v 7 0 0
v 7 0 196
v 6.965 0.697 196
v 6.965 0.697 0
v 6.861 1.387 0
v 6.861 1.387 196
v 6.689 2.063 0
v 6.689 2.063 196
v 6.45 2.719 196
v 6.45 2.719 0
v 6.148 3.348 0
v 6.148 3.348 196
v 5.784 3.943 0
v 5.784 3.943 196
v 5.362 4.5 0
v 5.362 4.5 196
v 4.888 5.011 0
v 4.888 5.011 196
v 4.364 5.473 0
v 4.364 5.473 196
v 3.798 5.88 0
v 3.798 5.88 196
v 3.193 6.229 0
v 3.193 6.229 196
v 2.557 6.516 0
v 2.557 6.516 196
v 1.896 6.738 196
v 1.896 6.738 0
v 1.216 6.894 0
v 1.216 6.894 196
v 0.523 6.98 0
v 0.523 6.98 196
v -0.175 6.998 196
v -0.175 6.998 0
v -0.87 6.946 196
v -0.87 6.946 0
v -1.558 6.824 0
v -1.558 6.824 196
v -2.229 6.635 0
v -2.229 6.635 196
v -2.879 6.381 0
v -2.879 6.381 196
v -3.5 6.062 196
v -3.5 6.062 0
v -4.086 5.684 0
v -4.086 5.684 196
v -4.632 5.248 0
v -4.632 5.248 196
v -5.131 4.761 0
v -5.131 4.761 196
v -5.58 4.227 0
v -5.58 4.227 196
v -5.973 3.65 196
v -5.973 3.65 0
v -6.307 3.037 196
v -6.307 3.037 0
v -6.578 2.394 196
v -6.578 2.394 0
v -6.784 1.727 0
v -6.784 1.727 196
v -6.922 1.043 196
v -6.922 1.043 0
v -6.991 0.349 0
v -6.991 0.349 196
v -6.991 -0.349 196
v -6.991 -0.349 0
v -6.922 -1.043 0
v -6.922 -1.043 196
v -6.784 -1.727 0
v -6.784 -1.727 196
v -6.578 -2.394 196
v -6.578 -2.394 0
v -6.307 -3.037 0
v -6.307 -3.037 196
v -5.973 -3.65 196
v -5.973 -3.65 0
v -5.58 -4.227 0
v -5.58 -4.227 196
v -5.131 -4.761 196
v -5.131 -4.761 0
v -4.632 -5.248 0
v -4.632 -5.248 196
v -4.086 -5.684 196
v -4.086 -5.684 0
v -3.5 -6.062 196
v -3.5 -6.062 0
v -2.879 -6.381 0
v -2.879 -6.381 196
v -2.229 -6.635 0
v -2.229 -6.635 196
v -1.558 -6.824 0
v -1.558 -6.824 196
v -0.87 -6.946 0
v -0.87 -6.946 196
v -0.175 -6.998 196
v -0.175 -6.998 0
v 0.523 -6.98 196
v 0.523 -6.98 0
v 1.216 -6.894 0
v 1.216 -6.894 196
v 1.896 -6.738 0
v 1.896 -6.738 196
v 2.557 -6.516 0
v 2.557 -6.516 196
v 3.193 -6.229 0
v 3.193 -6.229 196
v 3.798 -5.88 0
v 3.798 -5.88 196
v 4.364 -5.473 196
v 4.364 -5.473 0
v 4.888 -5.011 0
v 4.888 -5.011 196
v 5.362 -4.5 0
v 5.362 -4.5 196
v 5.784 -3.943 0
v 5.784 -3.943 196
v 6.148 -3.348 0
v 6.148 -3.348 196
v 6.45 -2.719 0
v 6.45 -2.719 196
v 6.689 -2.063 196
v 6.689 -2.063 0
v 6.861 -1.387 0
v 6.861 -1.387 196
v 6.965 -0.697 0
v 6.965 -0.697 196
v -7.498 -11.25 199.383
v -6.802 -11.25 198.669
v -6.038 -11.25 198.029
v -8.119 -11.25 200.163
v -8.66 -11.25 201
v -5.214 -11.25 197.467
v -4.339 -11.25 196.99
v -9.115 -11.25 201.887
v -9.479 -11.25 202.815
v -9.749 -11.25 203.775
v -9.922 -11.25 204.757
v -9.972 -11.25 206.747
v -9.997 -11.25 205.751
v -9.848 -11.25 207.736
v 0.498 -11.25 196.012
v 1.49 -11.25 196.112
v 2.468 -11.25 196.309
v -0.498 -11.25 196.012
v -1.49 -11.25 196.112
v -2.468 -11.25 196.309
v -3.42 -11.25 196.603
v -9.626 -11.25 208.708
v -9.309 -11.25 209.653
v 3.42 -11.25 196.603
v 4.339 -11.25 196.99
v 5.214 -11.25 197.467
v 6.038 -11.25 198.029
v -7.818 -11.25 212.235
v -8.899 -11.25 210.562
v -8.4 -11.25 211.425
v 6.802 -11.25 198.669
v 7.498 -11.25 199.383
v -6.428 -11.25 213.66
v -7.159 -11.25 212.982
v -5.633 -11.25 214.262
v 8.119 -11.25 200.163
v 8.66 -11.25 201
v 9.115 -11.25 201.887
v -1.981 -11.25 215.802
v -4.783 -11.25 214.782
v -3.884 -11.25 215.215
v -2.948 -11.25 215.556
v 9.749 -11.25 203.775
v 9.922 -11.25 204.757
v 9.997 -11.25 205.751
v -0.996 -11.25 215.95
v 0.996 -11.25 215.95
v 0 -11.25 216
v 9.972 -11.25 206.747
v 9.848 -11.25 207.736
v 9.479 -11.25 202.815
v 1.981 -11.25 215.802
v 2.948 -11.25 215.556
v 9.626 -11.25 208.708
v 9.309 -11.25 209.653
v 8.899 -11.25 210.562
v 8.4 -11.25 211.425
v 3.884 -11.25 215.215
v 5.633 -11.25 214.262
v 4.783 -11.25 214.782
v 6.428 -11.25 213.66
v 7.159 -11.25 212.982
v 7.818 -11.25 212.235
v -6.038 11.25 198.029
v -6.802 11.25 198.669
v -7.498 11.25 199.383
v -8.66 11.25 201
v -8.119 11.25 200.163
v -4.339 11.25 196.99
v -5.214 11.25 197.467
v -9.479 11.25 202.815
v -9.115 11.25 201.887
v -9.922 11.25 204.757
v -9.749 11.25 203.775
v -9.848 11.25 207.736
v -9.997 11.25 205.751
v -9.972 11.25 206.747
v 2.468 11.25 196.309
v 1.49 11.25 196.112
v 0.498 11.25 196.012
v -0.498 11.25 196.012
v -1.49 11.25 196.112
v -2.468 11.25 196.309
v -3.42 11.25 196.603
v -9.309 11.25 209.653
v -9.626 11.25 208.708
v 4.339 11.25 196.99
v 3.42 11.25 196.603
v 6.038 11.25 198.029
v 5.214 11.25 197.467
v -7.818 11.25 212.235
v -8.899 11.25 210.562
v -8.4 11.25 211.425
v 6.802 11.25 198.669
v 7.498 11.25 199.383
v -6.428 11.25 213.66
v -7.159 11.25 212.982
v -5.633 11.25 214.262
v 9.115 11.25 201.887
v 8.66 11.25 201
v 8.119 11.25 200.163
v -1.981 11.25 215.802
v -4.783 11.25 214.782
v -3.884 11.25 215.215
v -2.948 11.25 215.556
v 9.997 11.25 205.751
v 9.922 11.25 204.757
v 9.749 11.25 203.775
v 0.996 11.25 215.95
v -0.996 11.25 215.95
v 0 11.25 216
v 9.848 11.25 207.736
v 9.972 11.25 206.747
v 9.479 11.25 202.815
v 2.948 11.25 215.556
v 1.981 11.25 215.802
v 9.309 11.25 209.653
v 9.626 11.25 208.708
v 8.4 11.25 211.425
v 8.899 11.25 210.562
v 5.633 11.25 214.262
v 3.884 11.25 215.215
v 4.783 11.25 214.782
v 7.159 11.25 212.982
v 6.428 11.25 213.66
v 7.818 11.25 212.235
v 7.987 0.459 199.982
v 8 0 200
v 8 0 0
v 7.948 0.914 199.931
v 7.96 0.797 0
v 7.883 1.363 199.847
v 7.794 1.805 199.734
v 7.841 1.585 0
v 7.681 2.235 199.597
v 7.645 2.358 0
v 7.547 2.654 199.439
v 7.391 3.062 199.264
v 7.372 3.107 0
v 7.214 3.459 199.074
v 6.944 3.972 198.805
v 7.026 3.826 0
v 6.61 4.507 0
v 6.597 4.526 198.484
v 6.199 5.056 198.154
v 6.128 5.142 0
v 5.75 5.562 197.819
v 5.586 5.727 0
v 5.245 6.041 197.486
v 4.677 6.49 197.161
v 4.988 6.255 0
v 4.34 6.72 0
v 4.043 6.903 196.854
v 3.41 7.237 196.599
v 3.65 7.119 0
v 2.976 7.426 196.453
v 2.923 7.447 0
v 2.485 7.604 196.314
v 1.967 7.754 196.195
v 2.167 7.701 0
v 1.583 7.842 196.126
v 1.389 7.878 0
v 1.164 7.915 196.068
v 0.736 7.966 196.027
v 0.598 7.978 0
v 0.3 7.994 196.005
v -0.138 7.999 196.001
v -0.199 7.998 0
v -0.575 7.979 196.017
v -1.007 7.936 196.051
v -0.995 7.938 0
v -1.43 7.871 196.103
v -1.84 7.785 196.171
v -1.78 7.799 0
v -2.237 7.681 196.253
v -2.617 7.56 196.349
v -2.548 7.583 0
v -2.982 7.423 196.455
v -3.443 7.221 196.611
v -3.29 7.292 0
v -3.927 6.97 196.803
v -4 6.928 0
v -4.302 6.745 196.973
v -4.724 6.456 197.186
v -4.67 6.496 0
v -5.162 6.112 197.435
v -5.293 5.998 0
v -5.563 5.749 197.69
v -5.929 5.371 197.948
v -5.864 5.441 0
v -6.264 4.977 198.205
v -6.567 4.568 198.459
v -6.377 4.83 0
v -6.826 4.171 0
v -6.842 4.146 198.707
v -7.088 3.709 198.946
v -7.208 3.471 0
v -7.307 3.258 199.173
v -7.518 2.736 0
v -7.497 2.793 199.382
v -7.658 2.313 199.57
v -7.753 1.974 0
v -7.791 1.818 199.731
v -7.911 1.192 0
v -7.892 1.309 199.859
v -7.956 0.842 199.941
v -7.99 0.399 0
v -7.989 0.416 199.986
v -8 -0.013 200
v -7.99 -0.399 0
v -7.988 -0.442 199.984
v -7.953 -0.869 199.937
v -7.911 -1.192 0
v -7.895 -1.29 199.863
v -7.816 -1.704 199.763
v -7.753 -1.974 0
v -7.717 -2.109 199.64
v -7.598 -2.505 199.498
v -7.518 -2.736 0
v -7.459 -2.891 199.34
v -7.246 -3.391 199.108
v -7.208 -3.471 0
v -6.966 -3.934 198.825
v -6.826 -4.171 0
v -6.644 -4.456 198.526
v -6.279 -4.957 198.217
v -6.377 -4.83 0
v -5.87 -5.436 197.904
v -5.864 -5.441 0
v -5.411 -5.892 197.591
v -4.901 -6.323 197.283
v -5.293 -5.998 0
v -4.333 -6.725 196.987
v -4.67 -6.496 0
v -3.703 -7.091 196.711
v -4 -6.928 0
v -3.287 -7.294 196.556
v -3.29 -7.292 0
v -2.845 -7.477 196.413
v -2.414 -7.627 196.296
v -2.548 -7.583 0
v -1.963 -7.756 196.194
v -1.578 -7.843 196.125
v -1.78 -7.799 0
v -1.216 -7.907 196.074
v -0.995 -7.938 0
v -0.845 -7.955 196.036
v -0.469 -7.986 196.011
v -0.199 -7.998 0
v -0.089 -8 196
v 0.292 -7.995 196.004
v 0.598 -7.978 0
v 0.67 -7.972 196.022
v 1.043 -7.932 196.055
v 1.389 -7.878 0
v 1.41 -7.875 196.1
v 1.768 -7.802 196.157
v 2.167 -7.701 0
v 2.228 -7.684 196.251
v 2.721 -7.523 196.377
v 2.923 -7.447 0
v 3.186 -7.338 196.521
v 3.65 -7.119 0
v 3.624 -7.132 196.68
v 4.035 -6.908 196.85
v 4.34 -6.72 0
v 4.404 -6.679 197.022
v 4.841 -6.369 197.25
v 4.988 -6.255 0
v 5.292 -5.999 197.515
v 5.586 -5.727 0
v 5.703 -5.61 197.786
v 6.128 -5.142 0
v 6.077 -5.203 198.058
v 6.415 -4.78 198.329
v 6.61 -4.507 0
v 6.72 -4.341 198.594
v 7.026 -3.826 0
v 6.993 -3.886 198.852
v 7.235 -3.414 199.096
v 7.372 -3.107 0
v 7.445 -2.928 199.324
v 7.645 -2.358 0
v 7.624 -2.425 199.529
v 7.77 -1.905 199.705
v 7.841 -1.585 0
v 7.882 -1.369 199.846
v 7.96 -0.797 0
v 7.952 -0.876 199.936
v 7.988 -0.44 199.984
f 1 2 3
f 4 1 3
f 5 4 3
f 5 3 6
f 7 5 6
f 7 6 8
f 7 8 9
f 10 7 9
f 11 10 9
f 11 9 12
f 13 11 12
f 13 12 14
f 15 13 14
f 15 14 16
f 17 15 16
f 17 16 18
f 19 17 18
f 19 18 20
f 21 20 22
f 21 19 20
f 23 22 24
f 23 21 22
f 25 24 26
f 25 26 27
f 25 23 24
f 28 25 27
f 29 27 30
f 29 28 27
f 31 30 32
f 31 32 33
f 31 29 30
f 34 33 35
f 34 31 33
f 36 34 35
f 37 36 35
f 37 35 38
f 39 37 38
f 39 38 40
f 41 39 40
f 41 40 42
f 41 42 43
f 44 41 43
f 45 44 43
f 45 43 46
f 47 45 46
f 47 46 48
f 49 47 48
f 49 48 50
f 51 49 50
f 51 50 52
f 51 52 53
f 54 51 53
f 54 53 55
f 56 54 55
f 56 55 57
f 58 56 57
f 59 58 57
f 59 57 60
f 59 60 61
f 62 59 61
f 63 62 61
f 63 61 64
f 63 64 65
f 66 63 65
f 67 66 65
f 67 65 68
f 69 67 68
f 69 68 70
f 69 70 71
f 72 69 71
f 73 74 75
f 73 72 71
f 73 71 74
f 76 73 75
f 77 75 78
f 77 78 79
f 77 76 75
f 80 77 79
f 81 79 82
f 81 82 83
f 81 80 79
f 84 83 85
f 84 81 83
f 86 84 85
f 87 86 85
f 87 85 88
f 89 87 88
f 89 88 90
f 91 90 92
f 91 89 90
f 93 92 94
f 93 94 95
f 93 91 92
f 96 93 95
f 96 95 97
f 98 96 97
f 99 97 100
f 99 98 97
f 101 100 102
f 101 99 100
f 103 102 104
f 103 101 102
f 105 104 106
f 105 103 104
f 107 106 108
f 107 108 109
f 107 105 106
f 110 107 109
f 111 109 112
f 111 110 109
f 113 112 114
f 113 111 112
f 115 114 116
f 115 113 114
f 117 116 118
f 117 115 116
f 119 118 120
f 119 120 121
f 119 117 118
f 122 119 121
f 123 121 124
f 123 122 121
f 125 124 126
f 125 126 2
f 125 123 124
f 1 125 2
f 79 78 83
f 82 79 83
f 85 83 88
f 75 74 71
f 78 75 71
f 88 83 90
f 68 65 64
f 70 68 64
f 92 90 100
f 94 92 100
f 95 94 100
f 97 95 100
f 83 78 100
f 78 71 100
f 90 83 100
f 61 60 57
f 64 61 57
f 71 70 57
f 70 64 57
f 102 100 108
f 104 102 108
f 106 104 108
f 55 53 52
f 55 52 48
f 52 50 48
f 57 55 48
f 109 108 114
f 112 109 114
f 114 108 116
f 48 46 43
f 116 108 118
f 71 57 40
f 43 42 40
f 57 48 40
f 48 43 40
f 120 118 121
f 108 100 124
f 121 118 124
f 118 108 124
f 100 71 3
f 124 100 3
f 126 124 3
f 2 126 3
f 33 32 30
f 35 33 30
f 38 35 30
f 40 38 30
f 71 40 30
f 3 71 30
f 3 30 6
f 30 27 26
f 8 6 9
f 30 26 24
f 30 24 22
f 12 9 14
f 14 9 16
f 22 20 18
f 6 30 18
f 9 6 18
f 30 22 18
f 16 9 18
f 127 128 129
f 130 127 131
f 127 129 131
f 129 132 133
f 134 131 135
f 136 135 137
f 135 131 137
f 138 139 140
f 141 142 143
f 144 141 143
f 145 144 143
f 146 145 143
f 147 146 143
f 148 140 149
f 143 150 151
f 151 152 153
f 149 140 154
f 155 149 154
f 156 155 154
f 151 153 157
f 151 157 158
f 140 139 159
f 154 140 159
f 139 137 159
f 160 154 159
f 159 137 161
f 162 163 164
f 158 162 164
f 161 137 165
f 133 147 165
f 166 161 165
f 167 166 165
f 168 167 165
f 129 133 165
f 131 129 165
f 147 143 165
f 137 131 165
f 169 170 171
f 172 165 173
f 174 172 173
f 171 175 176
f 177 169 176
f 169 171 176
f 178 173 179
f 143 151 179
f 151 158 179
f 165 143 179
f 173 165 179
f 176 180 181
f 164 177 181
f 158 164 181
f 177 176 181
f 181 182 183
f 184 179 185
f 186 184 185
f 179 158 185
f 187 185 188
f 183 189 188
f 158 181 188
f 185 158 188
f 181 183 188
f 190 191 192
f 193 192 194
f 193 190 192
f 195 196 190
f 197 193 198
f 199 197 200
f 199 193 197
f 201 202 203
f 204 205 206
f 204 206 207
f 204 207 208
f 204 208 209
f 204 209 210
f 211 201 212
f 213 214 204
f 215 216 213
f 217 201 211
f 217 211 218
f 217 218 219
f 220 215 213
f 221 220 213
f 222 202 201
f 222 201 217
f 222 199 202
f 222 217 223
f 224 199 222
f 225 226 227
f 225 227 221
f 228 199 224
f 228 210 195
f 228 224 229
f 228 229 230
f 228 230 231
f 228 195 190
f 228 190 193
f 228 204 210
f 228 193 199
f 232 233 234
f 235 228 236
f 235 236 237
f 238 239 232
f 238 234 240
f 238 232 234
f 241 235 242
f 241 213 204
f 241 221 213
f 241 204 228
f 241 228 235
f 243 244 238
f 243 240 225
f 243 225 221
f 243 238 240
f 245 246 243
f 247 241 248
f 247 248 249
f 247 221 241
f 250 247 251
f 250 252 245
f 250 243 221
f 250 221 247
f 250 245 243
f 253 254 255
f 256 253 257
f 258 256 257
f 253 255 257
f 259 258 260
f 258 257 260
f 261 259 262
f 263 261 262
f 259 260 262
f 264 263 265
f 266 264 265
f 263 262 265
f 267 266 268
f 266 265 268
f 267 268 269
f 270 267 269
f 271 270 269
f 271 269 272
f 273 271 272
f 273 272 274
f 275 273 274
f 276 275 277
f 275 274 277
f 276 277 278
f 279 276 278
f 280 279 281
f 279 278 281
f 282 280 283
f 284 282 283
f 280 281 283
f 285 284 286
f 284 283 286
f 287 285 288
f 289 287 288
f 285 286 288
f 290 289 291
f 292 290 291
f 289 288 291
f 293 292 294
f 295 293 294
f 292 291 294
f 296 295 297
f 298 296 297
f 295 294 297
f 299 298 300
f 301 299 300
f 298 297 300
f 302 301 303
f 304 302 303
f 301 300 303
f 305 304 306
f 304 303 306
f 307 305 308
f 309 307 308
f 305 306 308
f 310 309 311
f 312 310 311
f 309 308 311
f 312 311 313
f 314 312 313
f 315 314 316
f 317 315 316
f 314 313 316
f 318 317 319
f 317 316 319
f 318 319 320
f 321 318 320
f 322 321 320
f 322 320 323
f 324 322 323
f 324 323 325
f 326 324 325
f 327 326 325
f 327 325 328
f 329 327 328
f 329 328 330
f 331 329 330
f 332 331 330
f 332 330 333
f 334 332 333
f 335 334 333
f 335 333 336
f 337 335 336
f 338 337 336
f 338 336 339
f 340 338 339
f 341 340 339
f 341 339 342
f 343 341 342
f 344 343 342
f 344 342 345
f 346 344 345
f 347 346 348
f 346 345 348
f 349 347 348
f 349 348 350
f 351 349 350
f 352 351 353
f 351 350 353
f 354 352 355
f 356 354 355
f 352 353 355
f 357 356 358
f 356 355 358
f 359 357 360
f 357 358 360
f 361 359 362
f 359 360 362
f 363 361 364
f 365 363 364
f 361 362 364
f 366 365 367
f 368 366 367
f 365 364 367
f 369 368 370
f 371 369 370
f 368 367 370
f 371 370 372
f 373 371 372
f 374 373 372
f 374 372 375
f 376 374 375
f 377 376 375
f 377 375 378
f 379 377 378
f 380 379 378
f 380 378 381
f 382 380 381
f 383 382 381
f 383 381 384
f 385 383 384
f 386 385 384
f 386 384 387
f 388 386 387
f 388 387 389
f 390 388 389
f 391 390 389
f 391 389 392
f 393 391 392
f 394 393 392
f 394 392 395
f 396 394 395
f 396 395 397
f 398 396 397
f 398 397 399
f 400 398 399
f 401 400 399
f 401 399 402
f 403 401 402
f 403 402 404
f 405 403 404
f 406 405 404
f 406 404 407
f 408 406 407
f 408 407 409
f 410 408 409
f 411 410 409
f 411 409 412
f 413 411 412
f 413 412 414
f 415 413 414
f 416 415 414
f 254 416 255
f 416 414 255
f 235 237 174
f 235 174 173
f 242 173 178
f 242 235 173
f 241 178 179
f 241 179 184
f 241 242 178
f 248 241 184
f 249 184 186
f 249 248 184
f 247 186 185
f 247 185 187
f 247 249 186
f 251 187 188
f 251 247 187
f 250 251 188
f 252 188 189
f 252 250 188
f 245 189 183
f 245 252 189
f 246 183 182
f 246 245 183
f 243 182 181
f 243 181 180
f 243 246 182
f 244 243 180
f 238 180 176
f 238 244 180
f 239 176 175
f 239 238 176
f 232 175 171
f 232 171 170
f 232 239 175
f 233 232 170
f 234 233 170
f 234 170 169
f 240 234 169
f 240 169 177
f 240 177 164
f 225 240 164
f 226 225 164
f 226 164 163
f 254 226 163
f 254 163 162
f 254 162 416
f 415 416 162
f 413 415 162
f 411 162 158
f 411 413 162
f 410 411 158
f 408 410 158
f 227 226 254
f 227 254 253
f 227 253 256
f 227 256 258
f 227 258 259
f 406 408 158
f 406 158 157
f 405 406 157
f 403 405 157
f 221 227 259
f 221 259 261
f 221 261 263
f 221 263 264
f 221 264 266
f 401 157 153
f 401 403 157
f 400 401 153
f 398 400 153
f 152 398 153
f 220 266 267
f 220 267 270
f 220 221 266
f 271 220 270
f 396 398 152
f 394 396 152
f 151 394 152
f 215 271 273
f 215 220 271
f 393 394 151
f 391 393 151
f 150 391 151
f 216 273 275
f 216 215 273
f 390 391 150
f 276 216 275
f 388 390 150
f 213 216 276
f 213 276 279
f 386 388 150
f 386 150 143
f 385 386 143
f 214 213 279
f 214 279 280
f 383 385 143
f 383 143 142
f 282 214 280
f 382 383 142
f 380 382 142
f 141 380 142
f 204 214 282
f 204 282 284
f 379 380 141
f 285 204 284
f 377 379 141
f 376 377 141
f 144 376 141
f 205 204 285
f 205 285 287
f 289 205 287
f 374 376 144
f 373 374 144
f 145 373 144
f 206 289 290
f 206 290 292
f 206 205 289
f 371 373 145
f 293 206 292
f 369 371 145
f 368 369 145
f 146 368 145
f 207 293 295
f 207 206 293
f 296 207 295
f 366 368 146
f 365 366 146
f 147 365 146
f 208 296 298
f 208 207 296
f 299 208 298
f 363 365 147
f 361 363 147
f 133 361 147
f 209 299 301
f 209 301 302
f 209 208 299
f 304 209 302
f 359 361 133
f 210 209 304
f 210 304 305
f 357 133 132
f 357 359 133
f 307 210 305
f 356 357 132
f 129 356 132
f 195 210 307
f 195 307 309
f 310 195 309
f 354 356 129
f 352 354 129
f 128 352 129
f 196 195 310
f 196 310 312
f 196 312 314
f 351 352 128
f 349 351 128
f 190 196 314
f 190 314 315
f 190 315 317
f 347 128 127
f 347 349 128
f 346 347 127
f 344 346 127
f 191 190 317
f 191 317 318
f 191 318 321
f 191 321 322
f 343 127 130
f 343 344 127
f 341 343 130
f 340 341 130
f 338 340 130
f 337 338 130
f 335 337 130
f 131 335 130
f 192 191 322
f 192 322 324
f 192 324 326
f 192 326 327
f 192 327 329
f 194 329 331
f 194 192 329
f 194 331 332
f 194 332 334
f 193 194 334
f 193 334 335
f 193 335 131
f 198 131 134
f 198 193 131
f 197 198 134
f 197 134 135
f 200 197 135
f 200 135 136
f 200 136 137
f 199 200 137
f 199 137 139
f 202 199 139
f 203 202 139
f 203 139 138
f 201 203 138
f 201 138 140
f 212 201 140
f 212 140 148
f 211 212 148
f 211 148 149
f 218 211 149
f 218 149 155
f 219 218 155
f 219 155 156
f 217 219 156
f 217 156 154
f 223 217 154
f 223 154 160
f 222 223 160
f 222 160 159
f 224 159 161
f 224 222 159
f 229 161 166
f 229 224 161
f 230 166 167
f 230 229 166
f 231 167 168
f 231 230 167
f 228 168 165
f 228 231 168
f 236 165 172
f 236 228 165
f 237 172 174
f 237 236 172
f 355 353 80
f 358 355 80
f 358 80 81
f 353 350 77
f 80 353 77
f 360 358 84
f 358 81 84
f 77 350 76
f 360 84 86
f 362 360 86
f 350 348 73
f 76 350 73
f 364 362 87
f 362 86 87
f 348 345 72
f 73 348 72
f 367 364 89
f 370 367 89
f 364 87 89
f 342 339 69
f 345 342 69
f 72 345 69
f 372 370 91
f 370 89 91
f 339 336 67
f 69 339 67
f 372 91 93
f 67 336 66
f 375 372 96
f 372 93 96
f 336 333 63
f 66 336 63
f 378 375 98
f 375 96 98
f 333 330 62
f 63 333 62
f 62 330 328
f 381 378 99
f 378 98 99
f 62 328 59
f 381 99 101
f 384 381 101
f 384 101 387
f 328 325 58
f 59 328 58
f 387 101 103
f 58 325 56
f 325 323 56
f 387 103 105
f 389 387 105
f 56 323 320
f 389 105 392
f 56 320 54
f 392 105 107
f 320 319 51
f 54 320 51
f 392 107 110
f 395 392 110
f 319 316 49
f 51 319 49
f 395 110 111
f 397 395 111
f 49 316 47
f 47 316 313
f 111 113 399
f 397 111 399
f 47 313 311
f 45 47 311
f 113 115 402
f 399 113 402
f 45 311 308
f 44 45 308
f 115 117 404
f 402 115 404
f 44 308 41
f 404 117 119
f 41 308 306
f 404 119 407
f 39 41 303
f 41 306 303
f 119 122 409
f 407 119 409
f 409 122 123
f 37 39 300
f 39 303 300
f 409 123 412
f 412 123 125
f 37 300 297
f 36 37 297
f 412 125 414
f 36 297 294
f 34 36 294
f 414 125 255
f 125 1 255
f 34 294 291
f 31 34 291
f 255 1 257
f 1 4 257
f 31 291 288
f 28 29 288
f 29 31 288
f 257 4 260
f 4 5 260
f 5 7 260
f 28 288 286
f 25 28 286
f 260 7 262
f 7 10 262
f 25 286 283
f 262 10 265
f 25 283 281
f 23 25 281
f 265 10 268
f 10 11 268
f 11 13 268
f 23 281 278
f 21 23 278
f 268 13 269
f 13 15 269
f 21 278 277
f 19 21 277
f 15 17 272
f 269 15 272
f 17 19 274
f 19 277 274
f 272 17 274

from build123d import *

# Parameters (mm, degrees)
SKETCH2_R           = 8
SKETCH2_R_2         = 7
BOSS_EXTRUDE1_DEPTH = 196
SKETCH3_R           = 8
BOSS_EXTRUDE2_DEPTH = 4
SKETCH6_R           = 10
BOSS_EXTRUDE3_DEPTH = 11.25


with BuildPart() as part:
    # Sketch2 → Boss-Extrude1 (new body)
    with BuildSketch(Plane.XY):
        Circle(SKETCH2_R)
        Circle(SKETCH2_R_2, mode=Mode.SUBTRACT)
    extrude(amount=BOSS_EXTRUDE1_DEPTH)

    # Sketch3 → Boss-Extrude2 (add)
    with BuildSketch(Plane.XY.offset(196)):
        Circle(SKETCH3_R)
    extrude(amount=BOSS_EXTRUDE2_DEPTH)

    # Sketch6 → Boss-Extrude3 (add, symmetric)
    with BuildSketch(Plane(origin=(0, 0, 0), x_dir=(1, 0, 0), z_dir=(0, 1, 0))):
        with Locations(Location((0, -206, 0), (0, 0, 270))):
            Circle(SKETCH6_R)
    extrude(amount=BOSS_EXTRUDE3_DEPTH, both=True)


solid = part.part
